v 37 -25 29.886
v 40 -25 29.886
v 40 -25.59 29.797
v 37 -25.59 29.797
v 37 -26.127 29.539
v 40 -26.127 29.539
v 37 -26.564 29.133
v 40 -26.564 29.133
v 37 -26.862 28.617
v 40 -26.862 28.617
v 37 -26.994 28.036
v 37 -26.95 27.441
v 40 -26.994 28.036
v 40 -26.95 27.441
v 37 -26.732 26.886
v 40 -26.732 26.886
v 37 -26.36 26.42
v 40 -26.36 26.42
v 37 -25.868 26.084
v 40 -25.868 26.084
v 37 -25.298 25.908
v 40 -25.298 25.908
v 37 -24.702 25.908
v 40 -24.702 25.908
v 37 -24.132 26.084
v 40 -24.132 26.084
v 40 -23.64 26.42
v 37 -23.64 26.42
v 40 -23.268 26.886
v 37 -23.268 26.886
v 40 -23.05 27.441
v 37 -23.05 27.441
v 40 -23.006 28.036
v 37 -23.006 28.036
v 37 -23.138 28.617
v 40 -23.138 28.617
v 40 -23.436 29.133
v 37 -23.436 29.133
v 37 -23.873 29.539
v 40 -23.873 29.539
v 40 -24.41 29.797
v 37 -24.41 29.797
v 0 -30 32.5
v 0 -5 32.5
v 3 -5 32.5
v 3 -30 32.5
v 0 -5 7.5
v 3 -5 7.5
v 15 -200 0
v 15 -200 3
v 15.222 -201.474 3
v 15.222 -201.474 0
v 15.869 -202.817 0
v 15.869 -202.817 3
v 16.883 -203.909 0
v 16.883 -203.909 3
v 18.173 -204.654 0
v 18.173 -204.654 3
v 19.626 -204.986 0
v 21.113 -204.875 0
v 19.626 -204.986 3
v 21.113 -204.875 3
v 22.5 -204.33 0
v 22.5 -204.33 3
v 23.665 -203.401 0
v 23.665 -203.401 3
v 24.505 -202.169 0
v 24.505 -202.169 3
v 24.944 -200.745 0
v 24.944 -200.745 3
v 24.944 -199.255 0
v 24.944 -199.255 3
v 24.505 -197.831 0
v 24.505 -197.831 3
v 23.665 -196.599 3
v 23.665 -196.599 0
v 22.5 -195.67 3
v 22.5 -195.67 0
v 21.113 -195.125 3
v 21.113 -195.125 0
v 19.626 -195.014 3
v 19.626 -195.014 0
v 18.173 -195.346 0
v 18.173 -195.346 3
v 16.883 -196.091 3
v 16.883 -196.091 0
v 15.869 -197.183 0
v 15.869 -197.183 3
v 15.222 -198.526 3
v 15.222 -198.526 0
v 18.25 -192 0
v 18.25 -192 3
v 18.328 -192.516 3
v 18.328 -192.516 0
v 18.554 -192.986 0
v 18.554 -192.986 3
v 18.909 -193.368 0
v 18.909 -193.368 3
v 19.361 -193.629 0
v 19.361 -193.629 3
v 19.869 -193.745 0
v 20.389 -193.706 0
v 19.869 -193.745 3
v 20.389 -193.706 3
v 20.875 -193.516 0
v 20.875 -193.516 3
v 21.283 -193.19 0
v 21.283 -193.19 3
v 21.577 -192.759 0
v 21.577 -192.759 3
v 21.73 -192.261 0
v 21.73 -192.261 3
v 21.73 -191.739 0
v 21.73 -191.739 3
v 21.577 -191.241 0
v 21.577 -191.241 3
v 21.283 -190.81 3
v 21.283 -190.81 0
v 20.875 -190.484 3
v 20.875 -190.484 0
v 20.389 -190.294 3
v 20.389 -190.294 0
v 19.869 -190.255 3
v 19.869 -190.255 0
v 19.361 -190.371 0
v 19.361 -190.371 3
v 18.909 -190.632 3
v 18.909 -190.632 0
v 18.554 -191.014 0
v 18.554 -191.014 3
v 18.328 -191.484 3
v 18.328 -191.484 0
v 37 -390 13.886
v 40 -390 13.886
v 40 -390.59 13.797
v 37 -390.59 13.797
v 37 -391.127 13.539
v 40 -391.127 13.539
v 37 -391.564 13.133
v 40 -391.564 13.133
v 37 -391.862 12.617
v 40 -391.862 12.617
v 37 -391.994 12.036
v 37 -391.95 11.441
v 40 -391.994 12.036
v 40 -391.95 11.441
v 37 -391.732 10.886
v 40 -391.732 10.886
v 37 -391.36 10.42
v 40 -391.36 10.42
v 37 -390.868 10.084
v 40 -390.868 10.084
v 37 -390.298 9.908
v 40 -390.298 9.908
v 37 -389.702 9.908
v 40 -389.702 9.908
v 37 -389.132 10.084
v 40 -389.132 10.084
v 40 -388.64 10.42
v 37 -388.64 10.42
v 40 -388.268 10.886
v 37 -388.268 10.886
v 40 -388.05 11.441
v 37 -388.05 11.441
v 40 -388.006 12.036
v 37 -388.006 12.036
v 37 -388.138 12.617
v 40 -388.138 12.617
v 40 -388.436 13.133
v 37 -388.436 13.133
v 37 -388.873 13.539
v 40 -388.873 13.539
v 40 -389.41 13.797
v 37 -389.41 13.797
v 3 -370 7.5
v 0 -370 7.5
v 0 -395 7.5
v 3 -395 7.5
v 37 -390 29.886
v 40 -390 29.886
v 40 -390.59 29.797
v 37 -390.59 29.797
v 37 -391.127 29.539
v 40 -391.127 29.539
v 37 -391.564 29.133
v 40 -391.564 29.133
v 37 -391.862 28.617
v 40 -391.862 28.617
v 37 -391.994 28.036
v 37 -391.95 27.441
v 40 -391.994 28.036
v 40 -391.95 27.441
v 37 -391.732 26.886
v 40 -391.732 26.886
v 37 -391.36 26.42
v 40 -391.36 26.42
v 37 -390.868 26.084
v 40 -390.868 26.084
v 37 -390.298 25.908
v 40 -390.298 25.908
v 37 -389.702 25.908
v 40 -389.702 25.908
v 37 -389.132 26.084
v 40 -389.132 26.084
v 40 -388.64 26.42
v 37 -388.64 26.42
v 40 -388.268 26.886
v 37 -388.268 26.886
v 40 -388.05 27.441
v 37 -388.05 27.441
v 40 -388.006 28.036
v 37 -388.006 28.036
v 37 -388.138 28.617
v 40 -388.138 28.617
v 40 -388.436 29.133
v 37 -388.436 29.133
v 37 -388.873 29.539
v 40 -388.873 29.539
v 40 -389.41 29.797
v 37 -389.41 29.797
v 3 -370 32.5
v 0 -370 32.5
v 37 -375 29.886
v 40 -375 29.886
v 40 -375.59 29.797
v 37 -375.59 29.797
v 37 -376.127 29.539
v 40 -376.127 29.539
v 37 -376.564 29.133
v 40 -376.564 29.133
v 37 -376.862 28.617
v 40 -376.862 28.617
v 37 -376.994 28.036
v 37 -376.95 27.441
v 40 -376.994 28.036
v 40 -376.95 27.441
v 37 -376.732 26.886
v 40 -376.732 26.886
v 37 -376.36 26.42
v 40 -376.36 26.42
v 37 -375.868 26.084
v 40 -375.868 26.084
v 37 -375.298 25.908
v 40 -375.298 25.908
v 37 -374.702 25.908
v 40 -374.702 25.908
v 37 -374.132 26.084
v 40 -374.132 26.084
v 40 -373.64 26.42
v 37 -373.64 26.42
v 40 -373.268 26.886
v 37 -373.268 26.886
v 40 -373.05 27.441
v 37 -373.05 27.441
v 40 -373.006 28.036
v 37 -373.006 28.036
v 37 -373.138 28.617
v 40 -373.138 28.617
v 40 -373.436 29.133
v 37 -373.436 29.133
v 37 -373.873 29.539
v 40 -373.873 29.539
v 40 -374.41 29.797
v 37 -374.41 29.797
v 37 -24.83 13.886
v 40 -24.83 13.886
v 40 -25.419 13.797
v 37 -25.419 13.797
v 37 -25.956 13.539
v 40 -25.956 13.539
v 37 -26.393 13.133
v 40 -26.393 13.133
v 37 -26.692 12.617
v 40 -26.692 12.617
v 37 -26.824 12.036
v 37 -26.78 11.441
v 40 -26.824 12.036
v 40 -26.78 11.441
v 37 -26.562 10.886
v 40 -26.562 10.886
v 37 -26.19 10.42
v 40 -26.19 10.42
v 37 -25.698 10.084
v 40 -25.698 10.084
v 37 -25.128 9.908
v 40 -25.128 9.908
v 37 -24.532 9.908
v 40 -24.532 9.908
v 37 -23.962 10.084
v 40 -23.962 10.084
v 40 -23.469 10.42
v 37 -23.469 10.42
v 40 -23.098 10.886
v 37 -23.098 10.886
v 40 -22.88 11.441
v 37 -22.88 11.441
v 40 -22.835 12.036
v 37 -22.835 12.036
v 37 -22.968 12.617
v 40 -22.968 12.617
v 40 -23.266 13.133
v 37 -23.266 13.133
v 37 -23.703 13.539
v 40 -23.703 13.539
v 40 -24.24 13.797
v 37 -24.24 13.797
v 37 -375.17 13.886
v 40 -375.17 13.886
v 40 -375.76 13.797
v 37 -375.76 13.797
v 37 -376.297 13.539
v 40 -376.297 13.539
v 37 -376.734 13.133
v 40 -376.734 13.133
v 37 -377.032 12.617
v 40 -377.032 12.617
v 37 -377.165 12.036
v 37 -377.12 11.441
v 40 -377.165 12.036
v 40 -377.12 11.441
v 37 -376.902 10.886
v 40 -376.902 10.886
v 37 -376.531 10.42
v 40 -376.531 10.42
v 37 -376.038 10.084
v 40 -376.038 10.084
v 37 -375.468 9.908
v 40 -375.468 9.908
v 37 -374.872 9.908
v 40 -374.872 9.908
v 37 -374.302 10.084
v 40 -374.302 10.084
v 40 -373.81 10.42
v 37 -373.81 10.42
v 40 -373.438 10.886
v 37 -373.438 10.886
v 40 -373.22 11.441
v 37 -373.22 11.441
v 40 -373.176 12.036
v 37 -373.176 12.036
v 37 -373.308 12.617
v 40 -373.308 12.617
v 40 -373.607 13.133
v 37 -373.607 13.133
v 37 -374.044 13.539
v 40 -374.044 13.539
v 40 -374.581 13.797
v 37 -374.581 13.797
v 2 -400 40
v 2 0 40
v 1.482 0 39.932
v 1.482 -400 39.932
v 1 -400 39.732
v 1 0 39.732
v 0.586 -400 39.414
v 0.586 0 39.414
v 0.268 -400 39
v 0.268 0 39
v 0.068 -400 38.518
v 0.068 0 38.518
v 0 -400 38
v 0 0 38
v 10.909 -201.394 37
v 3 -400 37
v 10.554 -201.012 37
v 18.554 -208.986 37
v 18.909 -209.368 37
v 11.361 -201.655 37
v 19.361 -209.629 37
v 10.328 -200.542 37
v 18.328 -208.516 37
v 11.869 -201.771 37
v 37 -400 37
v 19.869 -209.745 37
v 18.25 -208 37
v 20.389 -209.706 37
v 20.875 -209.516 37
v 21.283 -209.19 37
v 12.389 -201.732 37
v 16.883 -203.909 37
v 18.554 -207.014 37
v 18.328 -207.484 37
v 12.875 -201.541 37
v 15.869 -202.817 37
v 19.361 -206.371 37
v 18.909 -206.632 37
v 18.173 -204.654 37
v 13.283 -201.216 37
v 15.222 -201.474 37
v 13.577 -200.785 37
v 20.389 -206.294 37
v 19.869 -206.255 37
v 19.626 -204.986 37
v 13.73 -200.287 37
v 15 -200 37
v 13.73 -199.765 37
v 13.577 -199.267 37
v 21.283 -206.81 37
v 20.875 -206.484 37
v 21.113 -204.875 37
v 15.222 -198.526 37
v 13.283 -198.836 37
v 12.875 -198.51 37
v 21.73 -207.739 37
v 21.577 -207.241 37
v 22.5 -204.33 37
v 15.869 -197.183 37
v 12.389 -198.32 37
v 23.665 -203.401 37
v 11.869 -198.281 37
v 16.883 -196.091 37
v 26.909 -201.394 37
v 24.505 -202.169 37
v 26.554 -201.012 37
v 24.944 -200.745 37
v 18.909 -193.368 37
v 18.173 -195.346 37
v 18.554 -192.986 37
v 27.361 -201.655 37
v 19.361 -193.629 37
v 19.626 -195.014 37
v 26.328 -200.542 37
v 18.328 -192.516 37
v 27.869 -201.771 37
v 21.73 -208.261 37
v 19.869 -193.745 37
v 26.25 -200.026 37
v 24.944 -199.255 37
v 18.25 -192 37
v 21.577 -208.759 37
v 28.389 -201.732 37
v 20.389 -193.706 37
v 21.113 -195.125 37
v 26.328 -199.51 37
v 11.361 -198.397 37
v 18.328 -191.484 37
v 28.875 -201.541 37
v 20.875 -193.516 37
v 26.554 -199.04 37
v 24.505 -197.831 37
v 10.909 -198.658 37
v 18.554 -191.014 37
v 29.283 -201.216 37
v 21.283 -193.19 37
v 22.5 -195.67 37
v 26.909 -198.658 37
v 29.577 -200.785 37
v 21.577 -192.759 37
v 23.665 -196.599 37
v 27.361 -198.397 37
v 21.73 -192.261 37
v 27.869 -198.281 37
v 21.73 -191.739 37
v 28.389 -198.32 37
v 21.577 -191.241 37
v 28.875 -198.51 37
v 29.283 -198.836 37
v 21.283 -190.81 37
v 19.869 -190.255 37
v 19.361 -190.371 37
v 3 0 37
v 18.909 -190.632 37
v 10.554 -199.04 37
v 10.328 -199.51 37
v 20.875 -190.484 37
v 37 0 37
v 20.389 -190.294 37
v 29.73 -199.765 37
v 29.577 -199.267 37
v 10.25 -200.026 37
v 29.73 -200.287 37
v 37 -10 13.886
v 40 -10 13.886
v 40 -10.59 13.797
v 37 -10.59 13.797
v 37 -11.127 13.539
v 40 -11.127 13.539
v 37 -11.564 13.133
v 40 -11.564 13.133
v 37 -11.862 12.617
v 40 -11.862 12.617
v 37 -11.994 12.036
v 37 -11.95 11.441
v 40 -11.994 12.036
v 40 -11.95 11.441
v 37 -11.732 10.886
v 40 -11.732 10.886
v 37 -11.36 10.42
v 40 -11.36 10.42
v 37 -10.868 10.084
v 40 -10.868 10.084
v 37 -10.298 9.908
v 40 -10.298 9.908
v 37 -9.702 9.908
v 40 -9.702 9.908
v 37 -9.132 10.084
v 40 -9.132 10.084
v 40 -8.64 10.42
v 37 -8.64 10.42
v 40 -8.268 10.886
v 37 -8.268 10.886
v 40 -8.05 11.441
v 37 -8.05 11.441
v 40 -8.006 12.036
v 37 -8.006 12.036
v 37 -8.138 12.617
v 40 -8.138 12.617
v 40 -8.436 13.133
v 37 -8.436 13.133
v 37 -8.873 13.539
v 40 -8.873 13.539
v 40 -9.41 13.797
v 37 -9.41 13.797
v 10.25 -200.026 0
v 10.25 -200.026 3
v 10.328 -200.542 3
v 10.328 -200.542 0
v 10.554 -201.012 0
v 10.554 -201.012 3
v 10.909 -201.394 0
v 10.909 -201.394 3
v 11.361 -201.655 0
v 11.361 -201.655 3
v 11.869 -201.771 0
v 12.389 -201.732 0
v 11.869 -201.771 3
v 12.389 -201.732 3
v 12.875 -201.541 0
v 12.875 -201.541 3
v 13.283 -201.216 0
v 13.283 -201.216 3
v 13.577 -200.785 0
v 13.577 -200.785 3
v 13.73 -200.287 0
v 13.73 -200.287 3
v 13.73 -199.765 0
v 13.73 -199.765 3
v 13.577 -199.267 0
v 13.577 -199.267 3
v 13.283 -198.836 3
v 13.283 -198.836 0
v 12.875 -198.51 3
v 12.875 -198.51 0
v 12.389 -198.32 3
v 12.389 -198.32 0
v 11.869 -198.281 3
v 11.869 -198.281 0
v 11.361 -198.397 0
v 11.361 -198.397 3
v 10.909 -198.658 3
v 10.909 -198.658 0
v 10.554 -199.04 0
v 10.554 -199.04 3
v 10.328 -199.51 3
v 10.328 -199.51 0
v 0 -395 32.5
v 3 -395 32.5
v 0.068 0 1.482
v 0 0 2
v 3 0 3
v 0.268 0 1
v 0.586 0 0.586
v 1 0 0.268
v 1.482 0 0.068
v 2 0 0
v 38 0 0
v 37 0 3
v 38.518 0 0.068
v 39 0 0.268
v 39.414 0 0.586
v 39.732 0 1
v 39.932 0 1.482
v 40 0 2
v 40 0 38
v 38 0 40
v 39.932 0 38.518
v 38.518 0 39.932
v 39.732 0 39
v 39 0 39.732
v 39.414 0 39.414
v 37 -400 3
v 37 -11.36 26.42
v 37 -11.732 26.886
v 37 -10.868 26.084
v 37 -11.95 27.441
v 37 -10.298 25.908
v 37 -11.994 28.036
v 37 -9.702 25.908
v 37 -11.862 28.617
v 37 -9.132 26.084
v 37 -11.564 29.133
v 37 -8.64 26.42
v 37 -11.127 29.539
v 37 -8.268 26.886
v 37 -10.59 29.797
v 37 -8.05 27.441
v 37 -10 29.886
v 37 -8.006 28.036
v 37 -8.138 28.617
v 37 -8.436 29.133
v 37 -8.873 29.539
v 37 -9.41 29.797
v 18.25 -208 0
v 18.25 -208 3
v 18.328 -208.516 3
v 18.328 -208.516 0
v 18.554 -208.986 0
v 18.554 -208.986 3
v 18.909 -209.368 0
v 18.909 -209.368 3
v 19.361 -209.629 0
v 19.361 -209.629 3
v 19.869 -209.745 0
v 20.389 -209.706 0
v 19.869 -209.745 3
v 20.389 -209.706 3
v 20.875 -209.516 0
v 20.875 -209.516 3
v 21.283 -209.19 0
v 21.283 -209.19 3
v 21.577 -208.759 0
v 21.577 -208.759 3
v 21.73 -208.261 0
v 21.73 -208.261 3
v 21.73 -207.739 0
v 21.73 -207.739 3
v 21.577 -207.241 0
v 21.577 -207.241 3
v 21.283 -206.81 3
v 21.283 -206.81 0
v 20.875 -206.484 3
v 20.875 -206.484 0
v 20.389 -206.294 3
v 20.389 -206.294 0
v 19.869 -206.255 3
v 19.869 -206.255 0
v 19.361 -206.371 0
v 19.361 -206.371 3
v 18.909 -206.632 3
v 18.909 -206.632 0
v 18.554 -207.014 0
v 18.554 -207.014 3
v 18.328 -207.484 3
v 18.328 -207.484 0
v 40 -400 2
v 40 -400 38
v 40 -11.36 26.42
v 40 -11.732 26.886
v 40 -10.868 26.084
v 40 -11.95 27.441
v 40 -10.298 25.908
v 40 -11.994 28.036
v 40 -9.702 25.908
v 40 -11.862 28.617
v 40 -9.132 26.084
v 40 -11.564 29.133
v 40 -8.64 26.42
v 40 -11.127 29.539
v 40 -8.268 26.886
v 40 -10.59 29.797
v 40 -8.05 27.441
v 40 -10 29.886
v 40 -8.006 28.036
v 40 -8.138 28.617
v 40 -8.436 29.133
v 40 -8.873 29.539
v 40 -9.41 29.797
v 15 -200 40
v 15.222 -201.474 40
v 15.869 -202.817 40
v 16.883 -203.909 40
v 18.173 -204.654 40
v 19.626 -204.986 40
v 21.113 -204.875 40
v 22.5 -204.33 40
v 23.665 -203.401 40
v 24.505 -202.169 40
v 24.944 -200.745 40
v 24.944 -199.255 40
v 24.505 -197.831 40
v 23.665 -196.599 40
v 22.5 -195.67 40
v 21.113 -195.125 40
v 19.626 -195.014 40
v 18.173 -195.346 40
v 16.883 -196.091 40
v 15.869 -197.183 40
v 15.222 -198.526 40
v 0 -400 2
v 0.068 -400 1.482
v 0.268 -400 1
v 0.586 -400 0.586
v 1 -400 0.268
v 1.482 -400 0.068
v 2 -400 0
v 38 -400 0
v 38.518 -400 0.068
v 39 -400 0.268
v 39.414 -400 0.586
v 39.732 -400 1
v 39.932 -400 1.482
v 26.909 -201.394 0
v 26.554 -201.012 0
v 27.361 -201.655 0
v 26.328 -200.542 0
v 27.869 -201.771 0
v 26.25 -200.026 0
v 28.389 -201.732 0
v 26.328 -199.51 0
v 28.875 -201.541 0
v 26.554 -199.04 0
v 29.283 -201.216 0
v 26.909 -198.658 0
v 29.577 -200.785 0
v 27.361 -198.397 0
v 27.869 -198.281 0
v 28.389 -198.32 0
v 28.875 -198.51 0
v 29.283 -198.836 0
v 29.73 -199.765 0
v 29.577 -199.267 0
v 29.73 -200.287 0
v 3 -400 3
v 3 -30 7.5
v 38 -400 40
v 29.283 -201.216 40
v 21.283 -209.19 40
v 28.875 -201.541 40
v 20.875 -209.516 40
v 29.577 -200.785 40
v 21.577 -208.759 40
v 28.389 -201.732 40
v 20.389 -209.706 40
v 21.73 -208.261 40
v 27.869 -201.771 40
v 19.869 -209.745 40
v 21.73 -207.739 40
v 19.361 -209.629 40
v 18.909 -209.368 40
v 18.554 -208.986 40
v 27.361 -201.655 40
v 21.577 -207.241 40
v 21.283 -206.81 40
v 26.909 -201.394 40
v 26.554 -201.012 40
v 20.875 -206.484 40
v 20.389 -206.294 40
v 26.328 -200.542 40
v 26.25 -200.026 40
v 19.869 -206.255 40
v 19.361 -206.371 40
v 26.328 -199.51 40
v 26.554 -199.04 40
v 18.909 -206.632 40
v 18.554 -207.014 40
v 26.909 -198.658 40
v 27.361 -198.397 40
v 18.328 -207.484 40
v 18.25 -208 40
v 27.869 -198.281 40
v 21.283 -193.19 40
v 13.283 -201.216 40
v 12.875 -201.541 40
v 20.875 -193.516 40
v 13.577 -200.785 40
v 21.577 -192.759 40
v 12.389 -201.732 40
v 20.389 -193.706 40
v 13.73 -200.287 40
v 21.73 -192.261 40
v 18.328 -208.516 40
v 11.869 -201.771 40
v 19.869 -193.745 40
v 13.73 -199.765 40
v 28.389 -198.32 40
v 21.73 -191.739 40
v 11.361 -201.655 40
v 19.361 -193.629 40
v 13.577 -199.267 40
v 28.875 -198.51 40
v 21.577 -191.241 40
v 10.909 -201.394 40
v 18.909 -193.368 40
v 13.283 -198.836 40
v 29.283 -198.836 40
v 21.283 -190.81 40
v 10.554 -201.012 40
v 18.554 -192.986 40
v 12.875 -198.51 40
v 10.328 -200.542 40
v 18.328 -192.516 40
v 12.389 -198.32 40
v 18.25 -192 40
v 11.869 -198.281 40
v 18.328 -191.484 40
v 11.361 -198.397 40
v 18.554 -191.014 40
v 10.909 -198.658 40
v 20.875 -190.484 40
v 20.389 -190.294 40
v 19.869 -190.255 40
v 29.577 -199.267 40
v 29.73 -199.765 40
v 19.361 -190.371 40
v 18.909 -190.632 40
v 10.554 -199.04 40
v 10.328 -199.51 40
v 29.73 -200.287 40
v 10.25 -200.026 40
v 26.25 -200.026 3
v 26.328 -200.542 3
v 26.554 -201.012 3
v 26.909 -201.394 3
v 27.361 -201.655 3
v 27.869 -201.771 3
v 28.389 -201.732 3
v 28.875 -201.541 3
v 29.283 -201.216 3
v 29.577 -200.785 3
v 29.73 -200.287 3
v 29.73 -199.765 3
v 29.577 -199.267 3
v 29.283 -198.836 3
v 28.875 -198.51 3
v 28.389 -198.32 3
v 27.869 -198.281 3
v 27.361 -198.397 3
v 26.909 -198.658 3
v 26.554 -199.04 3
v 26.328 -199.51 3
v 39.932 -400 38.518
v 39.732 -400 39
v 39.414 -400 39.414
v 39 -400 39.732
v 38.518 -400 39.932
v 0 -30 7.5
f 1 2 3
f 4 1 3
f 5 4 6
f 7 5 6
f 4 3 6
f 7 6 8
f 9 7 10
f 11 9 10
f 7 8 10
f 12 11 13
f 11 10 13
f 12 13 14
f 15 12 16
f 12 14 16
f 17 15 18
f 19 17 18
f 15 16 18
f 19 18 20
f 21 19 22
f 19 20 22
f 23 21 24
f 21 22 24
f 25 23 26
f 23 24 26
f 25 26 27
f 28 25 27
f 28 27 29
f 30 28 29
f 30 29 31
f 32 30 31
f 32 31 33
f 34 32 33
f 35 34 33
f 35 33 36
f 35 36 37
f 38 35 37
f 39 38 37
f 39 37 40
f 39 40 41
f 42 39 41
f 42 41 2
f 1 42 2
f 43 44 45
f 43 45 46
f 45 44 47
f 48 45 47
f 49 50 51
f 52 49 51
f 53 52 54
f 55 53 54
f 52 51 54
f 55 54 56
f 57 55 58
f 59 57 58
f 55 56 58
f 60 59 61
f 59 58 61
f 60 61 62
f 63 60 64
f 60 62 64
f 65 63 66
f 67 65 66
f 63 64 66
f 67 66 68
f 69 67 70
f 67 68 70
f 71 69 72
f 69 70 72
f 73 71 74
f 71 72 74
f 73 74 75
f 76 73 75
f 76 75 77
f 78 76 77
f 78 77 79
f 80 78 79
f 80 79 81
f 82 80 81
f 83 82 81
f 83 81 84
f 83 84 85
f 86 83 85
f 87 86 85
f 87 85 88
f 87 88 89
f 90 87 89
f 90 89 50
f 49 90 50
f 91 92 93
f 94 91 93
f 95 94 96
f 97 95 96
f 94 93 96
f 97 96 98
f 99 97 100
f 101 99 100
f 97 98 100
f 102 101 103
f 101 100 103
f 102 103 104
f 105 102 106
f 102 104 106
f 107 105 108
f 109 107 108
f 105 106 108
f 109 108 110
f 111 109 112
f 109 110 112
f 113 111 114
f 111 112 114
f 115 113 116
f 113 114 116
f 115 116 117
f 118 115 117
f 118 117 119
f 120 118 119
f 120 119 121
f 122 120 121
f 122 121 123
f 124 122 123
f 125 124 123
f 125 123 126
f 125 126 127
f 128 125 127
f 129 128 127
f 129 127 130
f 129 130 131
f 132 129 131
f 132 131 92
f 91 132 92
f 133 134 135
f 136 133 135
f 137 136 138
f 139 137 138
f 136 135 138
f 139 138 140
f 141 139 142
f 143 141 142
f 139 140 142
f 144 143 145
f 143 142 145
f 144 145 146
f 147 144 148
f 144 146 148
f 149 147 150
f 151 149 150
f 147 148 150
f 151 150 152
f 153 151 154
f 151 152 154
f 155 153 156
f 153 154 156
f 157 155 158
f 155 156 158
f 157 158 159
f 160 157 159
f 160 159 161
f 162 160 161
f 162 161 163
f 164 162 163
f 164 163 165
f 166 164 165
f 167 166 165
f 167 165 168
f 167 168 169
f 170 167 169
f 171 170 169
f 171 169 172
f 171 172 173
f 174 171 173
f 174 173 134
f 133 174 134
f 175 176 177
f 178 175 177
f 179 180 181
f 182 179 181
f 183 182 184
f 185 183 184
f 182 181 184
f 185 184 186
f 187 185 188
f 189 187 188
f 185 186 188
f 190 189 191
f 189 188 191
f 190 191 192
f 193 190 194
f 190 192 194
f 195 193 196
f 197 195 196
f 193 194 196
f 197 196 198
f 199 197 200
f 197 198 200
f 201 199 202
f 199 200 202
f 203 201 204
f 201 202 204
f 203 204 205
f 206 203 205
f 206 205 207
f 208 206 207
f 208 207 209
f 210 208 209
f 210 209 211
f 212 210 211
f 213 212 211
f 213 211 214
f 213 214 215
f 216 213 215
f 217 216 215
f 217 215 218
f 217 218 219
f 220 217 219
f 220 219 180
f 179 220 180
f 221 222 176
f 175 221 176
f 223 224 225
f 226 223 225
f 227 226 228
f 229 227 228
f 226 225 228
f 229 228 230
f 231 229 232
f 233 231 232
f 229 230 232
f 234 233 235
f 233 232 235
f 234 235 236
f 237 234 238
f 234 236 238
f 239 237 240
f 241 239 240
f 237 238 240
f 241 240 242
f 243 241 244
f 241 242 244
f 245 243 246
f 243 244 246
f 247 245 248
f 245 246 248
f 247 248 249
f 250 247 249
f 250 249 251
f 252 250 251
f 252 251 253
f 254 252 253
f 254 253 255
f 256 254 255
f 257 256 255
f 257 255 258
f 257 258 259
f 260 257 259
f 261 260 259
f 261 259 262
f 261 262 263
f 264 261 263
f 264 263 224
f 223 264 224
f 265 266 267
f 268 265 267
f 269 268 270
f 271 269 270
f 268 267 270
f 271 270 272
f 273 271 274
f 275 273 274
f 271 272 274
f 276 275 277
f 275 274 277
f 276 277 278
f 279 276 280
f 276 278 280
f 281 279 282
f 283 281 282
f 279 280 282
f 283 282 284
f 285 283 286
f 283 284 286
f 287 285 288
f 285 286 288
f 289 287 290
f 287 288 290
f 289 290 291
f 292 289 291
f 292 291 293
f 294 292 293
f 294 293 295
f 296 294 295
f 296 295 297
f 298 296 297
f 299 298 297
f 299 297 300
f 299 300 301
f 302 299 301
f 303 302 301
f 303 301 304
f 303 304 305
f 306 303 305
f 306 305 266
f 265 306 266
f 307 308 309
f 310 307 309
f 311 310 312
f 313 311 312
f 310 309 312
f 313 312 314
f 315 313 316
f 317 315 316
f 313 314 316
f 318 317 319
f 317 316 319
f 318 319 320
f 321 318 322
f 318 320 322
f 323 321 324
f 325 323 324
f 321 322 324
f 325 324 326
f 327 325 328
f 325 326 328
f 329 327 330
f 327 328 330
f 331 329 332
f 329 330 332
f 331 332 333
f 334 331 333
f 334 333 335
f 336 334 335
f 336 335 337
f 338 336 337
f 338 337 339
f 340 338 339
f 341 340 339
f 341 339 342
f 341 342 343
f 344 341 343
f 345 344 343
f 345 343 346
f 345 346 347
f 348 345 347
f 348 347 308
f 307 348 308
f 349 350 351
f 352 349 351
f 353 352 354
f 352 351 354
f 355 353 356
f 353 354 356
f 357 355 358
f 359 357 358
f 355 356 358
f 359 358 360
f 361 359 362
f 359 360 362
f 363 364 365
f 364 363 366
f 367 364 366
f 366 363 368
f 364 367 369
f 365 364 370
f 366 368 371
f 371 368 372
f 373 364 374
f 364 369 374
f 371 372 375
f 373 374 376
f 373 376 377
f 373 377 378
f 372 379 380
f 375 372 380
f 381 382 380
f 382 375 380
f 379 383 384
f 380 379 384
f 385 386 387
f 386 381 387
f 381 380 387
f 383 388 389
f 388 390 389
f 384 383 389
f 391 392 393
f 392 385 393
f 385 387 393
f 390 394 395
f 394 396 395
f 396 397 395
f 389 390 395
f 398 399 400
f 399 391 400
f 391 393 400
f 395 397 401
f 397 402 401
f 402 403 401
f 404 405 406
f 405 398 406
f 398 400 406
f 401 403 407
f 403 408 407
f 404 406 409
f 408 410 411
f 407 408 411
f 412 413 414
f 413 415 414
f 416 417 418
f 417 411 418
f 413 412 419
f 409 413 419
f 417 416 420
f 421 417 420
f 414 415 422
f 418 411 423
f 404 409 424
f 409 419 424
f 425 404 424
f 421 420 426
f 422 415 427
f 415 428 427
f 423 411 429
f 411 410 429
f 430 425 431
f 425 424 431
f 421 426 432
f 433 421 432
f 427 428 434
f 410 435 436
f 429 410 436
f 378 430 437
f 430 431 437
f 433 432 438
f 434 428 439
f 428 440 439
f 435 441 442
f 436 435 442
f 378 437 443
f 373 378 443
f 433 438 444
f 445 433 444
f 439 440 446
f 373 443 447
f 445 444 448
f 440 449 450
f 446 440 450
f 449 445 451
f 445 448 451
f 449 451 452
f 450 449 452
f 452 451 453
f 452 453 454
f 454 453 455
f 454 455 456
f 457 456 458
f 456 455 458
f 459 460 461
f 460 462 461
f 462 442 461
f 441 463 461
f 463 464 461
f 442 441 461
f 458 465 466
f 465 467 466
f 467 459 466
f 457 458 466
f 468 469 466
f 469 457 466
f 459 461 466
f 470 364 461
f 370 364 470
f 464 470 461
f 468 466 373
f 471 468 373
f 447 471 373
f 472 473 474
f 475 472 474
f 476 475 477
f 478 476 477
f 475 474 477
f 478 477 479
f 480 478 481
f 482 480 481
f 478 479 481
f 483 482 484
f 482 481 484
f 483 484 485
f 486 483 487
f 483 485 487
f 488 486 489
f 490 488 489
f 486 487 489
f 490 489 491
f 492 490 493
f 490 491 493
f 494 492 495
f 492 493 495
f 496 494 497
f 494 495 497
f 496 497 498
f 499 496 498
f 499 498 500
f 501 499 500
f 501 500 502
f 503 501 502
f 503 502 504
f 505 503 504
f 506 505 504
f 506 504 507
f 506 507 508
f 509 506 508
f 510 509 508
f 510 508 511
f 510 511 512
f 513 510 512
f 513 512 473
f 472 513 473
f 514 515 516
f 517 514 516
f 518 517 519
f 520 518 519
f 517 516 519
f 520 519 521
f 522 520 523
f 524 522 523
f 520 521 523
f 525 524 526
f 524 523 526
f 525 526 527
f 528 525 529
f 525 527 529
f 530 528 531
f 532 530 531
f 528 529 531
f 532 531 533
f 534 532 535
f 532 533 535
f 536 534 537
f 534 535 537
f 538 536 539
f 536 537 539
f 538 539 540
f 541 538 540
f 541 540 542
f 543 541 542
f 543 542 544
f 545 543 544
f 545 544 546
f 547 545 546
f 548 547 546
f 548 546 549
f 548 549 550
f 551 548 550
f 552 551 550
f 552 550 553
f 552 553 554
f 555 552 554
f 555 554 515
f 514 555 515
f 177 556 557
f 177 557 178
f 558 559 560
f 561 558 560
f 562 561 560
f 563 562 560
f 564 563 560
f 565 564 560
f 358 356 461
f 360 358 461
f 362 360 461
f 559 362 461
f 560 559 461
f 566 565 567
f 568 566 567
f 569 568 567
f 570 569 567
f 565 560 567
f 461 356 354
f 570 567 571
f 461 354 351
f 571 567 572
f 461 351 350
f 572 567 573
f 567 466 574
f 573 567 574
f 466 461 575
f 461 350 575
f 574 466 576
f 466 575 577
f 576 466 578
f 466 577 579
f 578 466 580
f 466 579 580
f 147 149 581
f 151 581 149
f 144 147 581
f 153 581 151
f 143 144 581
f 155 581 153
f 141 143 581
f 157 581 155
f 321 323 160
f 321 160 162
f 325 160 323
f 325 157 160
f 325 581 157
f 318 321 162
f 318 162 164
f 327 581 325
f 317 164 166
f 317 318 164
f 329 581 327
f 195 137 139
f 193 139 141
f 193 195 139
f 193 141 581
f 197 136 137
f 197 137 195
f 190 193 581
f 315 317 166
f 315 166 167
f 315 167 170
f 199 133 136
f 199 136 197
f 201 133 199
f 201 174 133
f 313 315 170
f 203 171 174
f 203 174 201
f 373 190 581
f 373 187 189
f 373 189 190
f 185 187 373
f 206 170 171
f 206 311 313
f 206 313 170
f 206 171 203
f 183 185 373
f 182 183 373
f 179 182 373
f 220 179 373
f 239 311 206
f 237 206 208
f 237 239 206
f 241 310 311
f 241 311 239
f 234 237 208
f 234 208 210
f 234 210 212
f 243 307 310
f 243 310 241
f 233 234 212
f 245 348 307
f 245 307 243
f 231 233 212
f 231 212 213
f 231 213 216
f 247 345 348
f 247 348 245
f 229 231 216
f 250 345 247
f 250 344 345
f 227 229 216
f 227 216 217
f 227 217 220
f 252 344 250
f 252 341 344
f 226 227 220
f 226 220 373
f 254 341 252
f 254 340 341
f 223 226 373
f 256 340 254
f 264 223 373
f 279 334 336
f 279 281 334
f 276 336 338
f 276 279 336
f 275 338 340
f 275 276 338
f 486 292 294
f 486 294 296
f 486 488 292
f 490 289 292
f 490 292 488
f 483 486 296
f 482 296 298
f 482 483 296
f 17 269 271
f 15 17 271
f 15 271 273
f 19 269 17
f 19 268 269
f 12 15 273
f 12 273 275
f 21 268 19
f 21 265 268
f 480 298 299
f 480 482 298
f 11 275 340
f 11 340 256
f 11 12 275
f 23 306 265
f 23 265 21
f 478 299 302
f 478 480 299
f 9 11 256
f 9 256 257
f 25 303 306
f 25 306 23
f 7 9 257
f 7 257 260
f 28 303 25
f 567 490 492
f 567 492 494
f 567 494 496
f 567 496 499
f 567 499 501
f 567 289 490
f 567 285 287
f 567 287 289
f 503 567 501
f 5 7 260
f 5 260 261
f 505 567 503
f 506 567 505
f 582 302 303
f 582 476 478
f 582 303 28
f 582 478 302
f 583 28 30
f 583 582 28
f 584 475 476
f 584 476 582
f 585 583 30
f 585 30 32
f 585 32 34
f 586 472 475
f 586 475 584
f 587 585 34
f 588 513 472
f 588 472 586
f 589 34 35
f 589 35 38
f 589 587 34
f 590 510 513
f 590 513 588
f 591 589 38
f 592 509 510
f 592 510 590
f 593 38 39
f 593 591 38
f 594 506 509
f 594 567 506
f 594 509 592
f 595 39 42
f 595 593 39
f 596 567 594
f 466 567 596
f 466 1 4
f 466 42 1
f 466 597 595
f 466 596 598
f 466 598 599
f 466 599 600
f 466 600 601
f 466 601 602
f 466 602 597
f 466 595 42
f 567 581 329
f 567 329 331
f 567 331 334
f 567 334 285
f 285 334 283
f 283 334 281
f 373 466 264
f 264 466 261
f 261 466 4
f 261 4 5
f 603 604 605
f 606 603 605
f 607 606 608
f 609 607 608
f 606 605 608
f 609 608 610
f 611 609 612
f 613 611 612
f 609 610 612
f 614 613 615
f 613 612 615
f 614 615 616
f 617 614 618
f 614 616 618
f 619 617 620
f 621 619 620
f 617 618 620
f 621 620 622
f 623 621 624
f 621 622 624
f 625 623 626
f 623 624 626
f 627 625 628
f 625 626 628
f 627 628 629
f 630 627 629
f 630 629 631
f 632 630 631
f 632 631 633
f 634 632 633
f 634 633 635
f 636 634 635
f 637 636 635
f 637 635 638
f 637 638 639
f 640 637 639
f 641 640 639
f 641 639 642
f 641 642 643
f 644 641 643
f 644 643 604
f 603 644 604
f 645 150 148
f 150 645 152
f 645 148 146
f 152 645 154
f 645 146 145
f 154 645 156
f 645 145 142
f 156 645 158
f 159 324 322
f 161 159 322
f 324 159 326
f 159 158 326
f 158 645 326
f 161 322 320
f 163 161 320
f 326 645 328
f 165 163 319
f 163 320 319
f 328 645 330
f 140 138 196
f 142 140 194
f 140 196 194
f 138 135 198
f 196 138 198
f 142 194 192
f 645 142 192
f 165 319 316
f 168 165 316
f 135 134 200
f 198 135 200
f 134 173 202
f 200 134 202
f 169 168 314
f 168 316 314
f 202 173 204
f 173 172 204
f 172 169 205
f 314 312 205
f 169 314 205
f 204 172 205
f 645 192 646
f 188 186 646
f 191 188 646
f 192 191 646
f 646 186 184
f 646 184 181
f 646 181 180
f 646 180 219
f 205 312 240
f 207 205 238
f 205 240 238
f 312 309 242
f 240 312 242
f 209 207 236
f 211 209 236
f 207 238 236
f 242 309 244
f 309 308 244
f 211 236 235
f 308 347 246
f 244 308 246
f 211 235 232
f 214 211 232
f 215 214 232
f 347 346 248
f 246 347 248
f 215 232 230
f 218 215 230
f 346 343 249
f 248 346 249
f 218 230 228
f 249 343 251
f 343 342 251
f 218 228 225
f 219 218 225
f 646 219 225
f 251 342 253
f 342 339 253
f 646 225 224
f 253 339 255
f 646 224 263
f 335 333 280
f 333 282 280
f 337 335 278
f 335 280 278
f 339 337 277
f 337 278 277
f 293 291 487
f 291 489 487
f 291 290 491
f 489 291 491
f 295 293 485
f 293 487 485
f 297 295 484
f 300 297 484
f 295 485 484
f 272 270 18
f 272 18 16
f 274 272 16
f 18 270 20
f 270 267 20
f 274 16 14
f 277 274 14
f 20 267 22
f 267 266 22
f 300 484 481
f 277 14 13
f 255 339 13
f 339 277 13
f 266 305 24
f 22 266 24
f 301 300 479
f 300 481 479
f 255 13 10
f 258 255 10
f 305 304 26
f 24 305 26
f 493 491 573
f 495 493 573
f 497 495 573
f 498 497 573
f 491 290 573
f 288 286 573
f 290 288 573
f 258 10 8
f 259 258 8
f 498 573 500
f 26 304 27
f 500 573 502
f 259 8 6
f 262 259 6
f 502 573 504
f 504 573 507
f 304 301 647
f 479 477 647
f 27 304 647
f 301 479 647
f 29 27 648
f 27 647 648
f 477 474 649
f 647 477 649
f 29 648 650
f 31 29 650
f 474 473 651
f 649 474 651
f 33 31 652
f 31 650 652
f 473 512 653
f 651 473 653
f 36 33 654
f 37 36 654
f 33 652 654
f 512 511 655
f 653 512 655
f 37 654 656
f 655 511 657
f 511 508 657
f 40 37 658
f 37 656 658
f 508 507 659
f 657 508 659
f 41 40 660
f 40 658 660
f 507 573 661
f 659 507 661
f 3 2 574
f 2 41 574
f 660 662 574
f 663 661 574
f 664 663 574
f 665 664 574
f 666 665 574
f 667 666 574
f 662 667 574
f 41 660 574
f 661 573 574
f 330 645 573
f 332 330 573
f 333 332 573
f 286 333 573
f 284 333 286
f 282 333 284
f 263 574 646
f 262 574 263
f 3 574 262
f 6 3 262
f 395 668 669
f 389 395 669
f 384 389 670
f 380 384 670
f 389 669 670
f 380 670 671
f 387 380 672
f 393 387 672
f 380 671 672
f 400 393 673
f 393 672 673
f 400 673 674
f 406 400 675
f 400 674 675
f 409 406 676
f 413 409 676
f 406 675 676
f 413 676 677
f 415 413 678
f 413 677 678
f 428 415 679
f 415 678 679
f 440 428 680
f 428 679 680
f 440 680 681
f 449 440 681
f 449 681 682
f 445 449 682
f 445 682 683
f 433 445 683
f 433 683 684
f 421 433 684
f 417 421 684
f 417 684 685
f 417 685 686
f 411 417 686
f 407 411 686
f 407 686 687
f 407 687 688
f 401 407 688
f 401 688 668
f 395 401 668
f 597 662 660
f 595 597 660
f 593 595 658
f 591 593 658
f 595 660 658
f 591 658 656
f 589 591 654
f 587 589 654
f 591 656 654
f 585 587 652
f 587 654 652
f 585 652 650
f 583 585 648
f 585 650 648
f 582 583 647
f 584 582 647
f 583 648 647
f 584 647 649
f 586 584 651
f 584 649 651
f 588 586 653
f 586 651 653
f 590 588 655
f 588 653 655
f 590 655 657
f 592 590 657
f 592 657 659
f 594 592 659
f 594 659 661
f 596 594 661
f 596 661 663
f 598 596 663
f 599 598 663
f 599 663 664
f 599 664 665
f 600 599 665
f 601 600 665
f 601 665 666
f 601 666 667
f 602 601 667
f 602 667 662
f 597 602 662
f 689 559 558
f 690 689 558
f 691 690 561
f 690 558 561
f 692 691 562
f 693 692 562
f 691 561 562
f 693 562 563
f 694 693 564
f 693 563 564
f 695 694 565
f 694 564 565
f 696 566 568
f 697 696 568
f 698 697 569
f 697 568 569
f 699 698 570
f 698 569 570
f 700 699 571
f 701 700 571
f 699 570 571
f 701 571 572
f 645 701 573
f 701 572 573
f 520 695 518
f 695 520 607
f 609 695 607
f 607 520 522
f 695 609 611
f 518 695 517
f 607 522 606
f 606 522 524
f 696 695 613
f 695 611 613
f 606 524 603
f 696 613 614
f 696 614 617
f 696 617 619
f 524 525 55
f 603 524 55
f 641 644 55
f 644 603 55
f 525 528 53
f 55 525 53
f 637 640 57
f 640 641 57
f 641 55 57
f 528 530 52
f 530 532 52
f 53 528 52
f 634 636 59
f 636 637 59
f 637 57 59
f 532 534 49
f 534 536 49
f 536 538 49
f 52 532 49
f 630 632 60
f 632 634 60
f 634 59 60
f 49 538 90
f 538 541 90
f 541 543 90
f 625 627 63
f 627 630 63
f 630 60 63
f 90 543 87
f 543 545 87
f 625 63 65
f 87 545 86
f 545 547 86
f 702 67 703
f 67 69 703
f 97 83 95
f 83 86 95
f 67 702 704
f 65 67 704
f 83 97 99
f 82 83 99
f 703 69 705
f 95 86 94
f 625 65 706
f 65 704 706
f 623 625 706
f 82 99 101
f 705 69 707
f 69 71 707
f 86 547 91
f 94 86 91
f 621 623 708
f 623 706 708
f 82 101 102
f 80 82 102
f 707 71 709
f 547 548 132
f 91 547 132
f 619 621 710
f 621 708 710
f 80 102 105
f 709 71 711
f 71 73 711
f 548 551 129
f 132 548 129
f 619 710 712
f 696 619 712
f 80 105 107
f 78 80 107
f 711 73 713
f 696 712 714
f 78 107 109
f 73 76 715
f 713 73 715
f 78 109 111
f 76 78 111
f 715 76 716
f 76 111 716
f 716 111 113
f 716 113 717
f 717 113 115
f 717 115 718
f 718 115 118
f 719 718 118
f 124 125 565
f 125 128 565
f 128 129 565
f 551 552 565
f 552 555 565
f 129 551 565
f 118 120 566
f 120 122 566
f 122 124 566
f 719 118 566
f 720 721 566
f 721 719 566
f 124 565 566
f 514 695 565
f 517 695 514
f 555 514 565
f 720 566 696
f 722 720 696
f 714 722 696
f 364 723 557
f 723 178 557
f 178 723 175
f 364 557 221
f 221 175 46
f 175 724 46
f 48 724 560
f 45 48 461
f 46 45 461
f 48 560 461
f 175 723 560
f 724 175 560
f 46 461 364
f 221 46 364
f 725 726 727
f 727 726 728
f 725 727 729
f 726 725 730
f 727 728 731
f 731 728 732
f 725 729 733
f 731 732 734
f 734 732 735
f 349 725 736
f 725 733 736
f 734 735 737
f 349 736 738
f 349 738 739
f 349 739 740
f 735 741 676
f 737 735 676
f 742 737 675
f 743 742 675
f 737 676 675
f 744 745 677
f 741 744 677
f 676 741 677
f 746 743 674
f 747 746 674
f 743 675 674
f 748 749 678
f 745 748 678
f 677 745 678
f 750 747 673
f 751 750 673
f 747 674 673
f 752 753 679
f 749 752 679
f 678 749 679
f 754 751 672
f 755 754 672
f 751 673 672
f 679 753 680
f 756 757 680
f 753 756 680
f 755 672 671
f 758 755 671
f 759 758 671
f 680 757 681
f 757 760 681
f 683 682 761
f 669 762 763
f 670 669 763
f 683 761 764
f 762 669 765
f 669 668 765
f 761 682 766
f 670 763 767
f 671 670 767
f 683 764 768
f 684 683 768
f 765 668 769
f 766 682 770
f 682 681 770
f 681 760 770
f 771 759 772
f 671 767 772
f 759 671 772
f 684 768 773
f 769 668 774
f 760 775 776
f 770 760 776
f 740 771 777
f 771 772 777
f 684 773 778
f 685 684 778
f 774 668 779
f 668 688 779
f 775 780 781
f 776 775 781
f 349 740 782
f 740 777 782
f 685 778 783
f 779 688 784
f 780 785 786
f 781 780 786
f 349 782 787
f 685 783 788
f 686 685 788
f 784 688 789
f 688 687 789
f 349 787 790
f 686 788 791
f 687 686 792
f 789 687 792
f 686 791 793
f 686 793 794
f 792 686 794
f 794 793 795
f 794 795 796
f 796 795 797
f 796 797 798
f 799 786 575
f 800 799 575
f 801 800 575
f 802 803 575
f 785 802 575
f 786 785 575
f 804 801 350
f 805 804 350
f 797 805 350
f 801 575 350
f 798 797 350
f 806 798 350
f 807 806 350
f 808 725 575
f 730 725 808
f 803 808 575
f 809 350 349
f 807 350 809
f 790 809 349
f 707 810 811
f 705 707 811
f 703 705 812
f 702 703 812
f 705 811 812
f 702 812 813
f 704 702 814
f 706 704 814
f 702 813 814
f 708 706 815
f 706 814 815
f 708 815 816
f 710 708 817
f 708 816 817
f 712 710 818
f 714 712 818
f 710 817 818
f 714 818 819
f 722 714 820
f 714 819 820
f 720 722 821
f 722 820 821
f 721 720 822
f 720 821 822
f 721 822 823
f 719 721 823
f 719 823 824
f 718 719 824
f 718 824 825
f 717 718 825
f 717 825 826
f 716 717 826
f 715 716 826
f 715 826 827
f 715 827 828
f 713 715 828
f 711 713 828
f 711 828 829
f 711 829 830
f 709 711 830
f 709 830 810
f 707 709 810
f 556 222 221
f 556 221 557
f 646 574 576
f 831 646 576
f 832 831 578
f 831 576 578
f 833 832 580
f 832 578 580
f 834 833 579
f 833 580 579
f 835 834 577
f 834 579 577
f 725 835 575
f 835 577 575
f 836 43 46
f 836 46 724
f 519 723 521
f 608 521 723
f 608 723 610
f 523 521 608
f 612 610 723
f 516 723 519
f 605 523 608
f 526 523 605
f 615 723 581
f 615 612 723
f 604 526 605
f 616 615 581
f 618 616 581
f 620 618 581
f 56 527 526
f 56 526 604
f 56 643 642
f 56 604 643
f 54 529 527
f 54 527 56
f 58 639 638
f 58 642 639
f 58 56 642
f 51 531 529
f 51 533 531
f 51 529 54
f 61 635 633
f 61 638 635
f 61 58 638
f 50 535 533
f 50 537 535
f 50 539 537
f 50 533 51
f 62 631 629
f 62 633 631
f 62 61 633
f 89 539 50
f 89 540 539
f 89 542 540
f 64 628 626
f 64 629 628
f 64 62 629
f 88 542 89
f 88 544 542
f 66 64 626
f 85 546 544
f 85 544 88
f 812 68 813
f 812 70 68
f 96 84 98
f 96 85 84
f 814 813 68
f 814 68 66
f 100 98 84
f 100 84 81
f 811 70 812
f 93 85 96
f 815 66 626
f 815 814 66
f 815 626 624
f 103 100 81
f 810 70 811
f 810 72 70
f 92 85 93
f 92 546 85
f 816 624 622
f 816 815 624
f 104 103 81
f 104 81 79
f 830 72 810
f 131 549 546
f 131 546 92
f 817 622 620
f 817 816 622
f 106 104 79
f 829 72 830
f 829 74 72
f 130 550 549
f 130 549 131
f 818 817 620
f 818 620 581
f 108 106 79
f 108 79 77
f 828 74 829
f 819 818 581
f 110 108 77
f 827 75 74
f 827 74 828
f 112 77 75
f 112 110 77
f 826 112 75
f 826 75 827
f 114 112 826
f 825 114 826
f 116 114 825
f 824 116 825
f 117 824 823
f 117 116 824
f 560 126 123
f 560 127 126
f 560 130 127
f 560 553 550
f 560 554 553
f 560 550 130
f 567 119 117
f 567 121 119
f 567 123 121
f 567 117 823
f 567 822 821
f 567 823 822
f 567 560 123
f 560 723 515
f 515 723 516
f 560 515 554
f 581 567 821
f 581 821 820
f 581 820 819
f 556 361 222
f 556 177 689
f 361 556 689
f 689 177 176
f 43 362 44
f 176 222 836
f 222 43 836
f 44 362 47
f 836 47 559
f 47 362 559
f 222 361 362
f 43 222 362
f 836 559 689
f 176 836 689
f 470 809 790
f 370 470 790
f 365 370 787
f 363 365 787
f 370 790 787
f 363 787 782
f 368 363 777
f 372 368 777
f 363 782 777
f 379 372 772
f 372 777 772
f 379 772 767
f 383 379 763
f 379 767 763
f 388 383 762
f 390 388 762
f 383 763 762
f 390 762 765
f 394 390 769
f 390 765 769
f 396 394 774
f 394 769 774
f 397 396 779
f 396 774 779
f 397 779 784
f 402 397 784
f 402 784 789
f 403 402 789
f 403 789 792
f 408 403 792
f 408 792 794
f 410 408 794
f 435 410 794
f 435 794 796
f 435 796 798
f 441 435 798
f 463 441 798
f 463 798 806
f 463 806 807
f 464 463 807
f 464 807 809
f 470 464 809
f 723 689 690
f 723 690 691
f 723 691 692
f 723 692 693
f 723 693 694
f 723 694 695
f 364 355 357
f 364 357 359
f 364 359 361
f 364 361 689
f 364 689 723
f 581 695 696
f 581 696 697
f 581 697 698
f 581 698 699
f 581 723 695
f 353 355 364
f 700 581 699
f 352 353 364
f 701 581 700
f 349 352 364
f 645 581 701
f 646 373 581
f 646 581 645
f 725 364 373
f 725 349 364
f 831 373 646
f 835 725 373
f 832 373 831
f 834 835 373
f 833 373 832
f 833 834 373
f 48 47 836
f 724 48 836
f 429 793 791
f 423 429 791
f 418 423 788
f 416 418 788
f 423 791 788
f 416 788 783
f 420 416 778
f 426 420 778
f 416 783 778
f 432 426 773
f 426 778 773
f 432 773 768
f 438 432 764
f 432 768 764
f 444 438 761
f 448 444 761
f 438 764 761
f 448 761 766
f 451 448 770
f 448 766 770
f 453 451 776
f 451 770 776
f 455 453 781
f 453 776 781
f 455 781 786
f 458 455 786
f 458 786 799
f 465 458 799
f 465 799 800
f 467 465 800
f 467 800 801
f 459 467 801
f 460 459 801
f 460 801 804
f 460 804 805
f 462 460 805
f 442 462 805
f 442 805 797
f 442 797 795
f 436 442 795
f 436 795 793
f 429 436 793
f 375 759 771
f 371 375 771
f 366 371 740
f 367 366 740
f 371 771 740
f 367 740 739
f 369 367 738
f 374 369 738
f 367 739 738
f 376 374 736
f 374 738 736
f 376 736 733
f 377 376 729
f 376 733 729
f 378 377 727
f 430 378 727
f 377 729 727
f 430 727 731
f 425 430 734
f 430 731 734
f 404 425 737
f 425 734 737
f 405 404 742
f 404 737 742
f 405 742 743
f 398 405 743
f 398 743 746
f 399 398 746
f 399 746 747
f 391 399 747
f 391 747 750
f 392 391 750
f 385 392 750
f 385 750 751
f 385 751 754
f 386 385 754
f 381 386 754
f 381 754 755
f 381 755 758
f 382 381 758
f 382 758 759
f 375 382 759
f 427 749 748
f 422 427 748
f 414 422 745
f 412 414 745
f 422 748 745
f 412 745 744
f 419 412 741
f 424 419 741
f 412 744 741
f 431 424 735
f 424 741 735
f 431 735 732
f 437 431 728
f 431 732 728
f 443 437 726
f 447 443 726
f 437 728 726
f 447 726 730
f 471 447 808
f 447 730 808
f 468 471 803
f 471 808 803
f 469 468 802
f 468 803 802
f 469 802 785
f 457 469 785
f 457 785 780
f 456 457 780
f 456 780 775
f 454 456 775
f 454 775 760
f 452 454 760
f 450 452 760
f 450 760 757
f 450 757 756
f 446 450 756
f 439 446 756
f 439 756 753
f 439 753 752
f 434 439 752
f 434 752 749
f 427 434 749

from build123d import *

# Parameters (mm, degrees)
SKETCH_W       = 34
SKETCH_H       = 34
PAD_DEPTH      = 400
SKETCH001_R    = 5
HOLE_DEPTH     = 40.001
SKETCH002_R    = 1.75
HOLE001_DEPTH  = 40.001
SKETCH003_R    = 2
HOLE002_DEPTH  = 25
HOLE002_TIPS_R = 2
SKETCH004_W    = 25
SKETCH004_H    = 25
POCKET_DEPTH   = 3


with BuildPart() as part:
    # Sketch → Pad (new body)
    with BuildSketch(Plane.XZ):
        with BuildLine():
            Line((2, 0), (38, 0))
            ThreePointArc((38, 0), (39.414214, 0.585786), (40, 2))
            Line((40, 2), (40, 38))
            ThreePointArc((40, 38), (39.414214, 39.414214), (38, 40))
            Line((38, 40), (2, 40))
            ThreePointArc((2, 40), (0.585786, 39.414214), (0, 38))
            Line((0, 38), (0, 2))
            ThreePointArc((0, 2), (0.585786, 0.585786), (2, 0))
        make_face()
        with Locations((20, 20)):
            Rectangle(SKETCH_W, SKETCH_H, mode=Mode.SUBTRACT)
    extrude(amount=PAD_DEPTH)

    # Sketch001 (on Face5 of Pad) → Hole (cut, through all)
    with BuildSketch(Plane(origin=(0, 0, 40), x_dir=(-1, 0, 0), z_dir=(0, 0, 1))):
        with Locations((-20, 200)):
            Circle(SKETCH001_R)
    extrude(amount=-HOLE_DEPTH, mode=Mode.SUBTRACT)

    # Sketch002 (on Face10 of Hole) → Hole001 (cut, through all)
    with BuildSketch(Plane(origin=(0, 0, 40), x_dir=(-1, 0, 0), z_dir=(0, 0, 1))):
        with Locations((-12.000042, 200.025804)):
            Circle(SKETCH002_R)
        with Locations((-27.999958, 200.025804)):
            Circle(SKETCH002_R)
        with Locations((-20, 192)):
            Circle(SKETCH002_R)
        with Locations((-20, 208)):
            Circle(SKETCH002_R)
    extrude(amount=-HOLE001_DEPTH, mode=Mode.SUBTRACT)

    # Sketch003 (on Face12 of Hole001) → Hole002 (cut)
    with BuildSketch(Plane(origin=(40, 0, 0), x_dir=(0, 0, 1), z_dir=(1, 0, 0))):
        with Locations((27.886159, 10)):
            Circle(SKETCH003_R)
        with Locations((11.886159, 10)):
            Circle(SKETCH003_R)
        with Locations((27.886159, 25)):
            Circle(SKETCH003_R)
        with Locations((11.886159, 24.829785)):
            Circle(SKETCH003_R)
        with Locations((27.886159, 390)):
            Circle(SKETCH003_R)
        with Locations((11.886159, 390)):
            Circle(SKETCH003_R)
        with Locations((27.886159, 375)):
            Circle(SKETCH003_R)
        with Locations((11.886159, 375.170215)):
            Circle(SKETCH003_R)
    extrude(amount=-HOLE002_DEPTH, mode=Mode.SUBTRACT)

    # Hole002 tips → Hole002 tip 1 section 0
    with BuildSketch(Plane(origin=(15, 0, 0), x_dir=(0, 0, 1), z_dir=(1, 0, 0)), mode=Mode.PRIVATE) as hole002_tip_1_s0:
        with Locations((27.886159, 10)):
            Circle(HOLE002_TIPS_R)
    loft([hole002_tip_1_s0.sketch, Vertex(13.798279, -10, 27.886159)], mode=Mode.SUBTRACT)

    # Hole002 tips → Hole002 tip 2 section 0
    with BuildSketch(Plane(origin=(15, 0, 0), x_dir=(0, 0, 1), z_dir=(1, 0, 0)), mode=Mode.PRIVATE) as hole002_tip_2_s0:
        with Locations((11.886159, 10)):
            Circle(HOLE002_TIPS_R)
    loft([hole002_tip_2_s0.sketch, Vertex(13.798279, -10, 11.886159)], mode=Mode.SUBTRACT)

    # Hole002 tips → Hole002 tip 3 section 0
    with BuildSketch(Plane(origin=(15, 0, 0), x_dir=(0, 0, 1), z_dir=(1, 0, 0)), mode=Mode.PRIVATE) as hole002_tip_3_s0:
        with Locations((27.886159, 25)):
            Circle(HOLE002_TIPS_R)
    loft([hole002_tip_3_s0.sketch, Vertex(13.798279, -25, 27.886159)], mode=Mode.SUBTRACT)

    # Hole002 tips → Hole002 tip 4 section 0
    with BuildSketch(Plane(origin=(15, 0, 0), x_dir=(0, 0, 1), z_dir=(1, 0, 0)), mode=Mode.PRIVATE) as hole002_tip_4_s0:
        with Locations((11.886159, 24.829785)):
            Circle(HOLE002_TIPS_R)
    loft([hole002_tip_4_s0.sketch, Vertex(13.798279, -24.829785, 11.886159)], mode=Mode.SUBTRACT)

    # Hole002 tips → Hole002 tip 5 section 0
    with BuildSketch(Plane(origin=(15, 0, 0), x_dir=(0, 0, 1), z_dir=(1, 0, 0)), mode=Mode.PRIVATE) as hole002_tip_5_s0:
        with Locations((27.886159, 390)):
            Circle(HOLE002_TIPS_R)
    loft([hole002_tip_5_s0.sketch, Vertex(13.798279, -390, 27.886159)], mode=Mode.SUBTRACT)

    # Hole002 tips → Hole002 tip 6 section 0
    with BuildSketch(Plane(origin=(15, 0, 0), x_dir=(0, 0, 1), z_dir=(1, 0, 0)), mode=Mode.PRIVATE) as hole002_tip_6_s0:
        with Locations((11.886159, 390)):
            Circle(HOLE002_TIPS_R)
    loft([hole002_tip_6_s0.sketch, Vertex(13.798279, -390, 11.886159)], mode=Mode.SUBTRACT)

    # Hole002 tips → Hole002 tip 7 section 0
    with BuildSketch(Plane(origin=(15, 0, 0), x_dir=(0, 0, 1), z_dir=(1, 0, 0)), mode=Mode.PRIVATE) as hole002_tip_7_s0:
        with Locations((27.886159, 375)):
            Circle(HOLE002_TIPS_R)
    loft([hole002_tip_7_s0.sketch, Vertex(13.798279, -375, 27.886159)], mode=Mode.SUBTRACT)

    # Hole002 tips → Hole002 tip 8 section 0
    with BuildSketch(Plane(origin=(15, 0, 0), x_dir=(0, 0, 1), z_dir=(1, 0, 0)), mode=Mode.PRIVATE) as hole002_tip_8_s0:
        with Locations((11.886159, 375.170215)):
            Circle(HOLE002_TIPS_R)
    loft([hole002_tip_8_s0.sketch, Vertex(13.798279, -375.170215, 11.886159)], mode=Mode.SUBTRACT)

    # Sketch004 (on Face11 of Hole002) → Pocket (cut)
    with BuildSketch(Plane(origin=(0, 0, 0), x_dir=(0, 0, -1), z_dir=(-1, 0, 0))):
        with Locations((-20, 17.5)):
            Rectangle(SKETCH004_W, SKETCH004_H)
        with Locations((-20, 382.5)):
            Rectangle(SKETCH004_W, SKETCH004_H)
    extrude(amount=-POCKET_DEPTH, mode=Mode.SUBTRACT)


solid = part.part
